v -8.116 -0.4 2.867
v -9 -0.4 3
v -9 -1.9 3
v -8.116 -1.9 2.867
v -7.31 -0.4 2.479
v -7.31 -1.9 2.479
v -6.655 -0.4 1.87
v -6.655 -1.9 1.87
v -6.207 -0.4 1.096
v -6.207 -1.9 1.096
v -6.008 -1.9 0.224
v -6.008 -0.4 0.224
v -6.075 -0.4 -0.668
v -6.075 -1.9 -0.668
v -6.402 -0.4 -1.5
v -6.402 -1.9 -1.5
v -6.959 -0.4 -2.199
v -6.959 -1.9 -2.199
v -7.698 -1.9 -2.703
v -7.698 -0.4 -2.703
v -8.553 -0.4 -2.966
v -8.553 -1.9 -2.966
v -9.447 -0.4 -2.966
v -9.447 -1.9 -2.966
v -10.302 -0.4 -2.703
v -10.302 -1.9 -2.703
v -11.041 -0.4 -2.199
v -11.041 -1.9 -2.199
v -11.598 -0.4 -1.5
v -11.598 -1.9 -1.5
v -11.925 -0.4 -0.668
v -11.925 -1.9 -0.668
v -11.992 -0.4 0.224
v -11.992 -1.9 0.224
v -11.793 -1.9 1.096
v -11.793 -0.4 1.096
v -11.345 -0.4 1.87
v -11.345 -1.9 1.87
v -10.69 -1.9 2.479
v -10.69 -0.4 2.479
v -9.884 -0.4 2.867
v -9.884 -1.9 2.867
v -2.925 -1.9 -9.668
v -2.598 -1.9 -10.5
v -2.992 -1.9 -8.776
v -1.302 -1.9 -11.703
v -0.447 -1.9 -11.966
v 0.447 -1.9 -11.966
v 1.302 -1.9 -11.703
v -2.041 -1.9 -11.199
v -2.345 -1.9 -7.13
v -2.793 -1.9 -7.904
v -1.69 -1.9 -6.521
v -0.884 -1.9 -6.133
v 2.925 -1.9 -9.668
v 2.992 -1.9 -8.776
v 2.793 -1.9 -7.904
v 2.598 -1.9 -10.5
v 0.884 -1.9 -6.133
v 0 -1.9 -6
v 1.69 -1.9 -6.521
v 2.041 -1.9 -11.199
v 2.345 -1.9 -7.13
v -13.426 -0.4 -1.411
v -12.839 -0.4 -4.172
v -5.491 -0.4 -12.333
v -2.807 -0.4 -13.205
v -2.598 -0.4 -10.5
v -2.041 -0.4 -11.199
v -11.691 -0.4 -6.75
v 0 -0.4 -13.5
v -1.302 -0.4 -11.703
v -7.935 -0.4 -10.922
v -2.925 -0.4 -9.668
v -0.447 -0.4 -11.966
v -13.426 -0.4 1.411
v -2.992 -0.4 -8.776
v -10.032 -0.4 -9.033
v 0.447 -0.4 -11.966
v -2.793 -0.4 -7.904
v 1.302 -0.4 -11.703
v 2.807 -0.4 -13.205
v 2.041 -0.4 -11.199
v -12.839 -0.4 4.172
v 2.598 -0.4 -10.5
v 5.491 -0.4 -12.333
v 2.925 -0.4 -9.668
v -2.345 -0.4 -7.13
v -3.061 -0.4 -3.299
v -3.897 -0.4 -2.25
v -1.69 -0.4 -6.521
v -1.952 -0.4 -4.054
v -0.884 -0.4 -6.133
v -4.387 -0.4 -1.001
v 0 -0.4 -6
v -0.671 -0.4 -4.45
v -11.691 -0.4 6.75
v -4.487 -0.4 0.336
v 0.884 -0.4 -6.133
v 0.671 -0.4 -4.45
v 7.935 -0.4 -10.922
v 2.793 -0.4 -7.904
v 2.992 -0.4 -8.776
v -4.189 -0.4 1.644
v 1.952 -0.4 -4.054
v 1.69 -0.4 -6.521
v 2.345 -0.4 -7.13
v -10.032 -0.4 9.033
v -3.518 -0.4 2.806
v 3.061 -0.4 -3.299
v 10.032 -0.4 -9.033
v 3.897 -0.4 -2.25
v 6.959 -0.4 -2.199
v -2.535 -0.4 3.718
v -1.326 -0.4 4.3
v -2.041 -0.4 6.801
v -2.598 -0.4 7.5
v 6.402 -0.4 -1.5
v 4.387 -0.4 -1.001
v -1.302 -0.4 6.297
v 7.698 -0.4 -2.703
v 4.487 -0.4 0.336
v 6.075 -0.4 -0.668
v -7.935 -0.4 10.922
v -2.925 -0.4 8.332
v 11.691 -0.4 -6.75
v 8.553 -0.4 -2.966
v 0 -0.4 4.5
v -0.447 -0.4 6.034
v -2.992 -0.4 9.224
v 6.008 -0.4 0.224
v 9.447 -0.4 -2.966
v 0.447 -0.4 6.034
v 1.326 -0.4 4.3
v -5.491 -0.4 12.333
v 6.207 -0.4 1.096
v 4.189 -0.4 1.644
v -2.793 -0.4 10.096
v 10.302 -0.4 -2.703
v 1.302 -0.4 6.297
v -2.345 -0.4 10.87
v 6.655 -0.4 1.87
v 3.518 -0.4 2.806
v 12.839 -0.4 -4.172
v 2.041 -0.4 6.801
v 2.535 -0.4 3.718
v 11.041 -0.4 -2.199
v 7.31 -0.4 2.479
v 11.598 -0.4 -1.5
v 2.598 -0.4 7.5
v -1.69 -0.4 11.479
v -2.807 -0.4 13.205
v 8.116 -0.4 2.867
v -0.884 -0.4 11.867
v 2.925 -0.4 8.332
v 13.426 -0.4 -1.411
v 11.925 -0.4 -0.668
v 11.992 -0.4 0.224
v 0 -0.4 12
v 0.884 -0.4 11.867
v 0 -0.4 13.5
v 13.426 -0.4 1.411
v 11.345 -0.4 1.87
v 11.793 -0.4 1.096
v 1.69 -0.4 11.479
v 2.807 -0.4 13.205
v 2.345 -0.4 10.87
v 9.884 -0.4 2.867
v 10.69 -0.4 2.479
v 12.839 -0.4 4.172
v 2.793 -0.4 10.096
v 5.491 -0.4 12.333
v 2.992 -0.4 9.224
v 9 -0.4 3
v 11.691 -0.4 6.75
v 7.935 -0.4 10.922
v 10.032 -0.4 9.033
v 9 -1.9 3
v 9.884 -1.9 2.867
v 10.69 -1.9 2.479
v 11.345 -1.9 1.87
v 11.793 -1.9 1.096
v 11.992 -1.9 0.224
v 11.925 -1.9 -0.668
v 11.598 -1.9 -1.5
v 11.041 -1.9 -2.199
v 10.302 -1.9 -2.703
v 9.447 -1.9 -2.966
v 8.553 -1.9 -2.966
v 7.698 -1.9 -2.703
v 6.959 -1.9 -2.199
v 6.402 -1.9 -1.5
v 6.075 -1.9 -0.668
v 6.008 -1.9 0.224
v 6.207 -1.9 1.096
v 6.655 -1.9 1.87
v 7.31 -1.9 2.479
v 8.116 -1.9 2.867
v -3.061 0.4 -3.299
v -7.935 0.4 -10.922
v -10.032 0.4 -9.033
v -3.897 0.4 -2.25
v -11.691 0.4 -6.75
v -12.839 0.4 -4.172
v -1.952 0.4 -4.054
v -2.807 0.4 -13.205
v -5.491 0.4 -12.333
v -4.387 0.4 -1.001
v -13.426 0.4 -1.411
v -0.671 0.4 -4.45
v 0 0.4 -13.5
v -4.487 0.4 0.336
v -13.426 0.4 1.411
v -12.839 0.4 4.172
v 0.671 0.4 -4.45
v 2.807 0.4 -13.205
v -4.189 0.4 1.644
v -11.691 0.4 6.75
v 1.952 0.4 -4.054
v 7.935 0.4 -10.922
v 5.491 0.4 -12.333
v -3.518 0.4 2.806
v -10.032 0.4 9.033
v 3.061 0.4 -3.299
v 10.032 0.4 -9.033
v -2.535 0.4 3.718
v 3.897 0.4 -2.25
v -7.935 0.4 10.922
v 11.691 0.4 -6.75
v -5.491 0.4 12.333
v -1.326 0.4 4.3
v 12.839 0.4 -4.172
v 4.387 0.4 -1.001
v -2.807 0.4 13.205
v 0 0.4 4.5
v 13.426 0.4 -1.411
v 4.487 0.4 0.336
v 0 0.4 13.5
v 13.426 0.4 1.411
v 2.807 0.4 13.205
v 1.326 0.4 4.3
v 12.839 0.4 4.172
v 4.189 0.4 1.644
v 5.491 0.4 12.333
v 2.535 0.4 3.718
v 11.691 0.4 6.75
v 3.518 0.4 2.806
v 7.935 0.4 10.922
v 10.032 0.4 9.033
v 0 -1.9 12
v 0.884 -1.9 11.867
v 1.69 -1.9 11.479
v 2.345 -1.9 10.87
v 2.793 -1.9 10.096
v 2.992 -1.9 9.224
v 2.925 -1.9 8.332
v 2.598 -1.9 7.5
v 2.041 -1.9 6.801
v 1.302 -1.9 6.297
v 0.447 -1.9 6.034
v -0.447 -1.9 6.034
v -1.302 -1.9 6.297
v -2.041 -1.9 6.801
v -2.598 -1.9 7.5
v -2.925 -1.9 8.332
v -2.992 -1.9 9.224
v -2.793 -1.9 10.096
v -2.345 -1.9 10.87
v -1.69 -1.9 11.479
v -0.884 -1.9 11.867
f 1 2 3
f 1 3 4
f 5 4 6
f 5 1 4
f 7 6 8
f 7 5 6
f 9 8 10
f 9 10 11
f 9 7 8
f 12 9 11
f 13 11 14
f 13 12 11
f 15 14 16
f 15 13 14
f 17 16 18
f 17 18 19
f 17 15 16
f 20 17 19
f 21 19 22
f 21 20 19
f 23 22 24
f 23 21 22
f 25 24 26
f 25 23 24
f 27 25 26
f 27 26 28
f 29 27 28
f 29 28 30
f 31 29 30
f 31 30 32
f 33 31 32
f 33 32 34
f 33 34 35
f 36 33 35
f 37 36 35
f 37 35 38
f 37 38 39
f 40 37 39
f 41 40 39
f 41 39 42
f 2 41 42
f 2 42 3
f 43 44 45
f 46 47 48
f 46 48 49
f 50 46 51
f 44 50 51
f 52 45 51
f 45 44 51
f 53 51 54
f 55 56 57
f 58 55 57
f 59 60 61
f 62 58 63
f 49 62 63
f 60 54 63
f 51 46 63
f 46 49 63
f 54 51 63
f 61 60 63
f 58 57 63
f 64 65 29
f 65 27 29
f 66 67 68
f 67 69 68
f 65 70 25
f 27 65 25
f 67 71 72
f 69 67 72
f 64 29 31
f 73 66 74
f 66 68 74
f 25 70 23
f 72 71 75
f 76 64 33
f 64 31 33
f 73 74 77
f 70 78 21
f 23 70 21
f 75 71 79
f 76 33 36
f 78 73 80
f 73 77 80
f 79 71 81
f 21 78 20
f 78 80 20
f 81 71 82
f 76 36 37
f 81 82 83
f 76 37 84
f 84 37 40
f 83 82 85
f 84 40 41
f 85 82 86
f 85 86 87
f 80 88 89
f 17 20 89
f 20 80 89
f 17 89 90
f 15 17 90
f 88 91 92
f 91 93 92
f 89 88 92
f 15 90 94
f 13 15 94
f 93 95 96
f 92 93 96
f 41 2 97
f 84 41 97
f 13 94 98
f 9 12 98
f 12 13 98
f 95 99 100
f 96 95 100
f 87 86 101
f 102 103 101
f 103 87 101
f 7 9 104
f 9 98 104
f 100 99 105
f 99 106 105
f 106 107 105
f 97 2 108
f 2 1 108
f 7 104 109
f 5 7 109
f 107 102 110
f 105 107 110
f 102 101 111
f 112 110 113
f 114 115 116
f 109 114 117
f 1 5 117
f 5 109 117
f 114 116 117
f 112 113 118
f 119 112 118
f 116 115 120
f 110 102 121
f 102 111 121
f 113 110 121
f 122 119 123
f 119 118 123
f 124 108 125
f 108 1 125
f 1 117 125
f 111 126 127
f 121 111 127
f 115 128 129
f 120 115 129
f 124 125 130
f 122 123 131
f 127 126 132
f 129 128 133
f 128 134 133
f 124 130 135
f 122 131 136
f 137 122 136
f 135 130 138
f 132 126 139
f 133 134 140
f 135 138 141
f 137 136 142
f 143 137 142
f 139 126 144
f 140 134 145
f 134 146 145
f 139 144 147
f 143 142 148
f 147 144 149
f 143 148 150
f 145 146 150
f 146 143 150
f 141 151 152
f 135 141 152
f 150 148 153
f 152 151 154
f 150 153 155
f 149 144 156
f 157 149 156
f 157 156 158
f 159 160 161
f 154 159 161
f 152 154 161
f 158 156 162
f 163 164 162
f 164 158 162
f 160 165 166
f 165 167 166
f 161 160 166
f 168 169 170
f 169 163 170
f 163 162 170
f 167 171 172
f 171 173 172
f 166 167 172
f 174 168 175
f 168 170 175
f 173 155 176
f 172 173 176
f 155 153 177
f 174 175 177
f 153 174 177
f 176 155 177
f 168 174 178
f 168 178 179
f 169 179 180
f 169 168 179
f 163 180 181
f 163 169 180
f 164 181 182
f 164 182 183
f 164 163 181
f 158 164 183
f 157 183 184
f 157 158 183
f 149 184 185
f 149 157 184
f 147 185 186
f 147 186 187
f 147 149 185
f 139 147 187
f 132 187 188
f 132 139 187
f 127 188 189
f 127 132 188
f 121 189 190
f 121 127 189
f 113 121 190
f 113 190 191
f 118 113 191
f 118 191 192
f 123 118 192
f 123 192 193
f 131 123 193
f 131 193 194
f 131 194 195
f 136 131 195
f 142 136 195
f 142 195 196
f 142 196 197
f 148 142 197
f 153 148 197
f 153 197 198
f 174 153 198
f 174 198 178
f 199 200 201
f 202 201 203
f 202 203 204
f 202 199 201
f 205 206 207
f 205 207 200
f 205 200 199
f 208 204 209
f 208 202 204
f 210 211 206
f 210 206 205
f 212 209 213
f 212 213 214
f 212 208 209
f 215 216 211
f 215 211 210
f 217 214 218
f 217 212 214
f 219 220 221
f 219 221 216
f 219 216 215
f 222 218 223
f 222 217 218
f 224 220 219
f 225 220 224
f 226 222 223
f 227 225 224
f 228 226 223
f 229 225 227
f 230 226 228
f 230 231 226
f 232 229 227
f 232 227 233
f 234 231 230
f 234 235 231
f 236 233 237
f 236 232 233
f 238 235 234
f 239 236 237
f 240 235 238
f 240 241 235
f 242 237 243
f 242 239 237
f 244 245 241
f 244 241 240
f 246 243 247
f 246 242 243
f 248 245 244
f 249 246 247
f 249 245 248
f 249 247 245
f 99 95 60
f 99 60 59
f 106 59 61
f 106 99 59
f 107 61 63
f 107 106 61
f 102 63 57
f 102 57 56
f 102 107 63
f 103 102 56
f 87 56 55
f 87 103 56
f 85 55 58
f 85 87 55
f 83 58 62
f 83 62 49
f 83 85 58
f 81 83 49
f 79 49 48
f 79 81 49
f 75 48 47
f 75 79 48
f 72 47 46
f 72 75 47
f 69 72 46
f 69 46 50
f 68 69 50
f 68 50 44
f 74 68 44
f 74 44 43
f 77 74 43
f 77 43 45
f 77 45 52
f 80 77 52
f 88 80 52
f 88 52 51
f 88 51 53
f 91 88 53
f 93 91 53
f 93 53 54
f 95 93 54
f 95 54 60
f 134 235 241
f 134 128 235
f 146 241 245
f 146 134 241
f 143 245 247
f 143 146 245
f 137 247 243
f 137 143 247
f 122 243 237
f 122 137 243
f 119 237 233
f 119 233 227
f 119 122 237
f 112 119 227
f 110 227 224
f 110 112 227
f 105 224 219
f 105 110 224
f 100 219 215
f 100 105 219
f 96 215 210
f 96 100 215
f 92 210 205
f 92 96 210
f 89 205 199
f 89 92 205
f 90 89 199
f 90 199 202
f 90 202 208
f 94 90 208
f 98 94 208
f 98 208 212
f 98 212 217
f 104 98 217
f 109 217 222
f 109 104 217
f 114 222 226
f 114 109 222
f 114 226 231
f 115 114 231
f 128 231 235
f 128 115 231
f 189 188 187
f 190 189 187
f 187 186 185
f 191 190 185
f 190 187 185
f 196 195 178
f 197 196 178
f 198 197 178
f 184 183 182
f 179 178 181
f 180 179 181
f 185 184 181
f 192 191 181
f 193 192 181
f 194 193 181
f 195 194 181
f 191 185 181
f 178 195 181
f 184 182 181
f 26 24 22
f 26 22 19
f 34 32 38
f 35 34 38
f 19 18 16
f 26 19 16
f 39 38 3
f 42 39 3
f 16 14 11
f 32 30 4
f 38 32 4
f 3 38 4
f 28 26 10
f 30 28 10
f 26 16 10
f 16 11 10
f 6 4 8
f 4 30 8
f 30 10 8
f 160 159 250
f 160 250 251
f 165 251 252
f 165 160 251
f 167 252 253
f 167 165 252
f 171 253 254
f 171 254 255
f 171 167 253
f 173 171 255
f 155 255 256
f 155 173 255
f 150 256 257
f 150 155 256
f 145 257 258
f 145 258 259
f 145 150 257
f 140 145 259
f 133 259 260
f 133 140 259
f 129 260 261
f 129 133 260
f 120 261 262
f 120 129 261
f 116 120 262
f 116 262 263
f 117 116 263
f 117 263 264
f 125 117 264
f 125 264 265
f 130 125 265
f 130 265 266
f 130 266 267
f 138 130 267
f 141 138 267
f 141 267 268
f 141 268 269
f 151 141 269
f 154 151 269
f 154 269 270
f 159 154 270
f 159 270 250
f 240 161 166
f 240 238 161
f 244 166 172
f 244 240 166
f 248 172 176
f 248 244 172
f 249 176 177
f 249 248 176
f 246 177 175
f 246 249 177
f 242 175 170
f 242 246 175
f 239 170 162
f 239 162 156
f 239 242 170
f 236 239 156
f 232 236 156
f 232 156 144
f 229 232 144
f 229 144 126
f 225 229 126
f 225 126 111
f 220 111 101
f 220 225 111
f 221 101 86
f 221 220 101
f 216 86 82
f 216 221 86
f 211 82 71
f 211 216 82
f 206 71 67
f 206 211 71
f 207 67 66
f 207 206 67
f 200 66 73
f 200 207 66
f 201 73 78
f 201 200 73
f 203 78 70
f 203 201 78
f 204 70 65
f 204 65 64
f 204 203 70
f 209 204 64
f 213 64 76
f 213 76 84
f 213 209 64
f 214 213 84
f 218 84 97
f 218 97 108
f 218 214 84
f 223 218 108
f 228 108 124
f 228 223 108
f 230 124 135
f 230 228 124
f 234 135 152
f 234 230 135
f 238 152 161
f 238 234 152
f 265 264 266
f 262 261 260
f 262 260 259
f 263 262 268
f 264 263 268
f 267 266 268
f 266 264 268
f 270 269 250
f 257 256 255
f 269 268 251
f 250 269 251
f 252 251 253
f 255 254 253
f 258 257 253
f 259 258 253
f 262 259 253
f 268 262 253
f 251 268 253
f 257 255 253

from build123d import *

# Parameters (mm, degrees)
SKETCH1_R           = 13.5
SKETCH1_R_2         = 4.5
BOSS_EXTRUDE1_DEPTH = 0.4
SKETCH2_R           = 3
BOSS_EXTRUDE3_DEPTH = 1.9


with BuildPart() as part:
    # Sketch1 → Boss-Extrude1 (new, symmetric)
    with BuildSketch(Plane(origin=(0, 0, 0), x_dir=(1, 0, 0), z_dir=(0, 1, 0))):
        with Locations(Location((0, 0, 0), (0, 0, 270))):
            Circle(SKETCH1_R)
        with Locations(Location((0, 0, 0), (0, 0, 270))):
            Circle(SKETCH1_R_2, mode=Mode.SUBTRACT)
    extrude(amount=BOSS_EXTRUDE1_DEPTH, both=True)

    # Sketch2 → Boss-Extrude3 (add)
    with BuildSketch(Plane(origin=(0, 0, 0), x_dir=(1, 0, 0), z_dir=(0, 1, 0))):
        with Locations(Location((0, 9, 0), (0, 0, 270))):
            Circle(SKETCH2_R)
        with Locations(Location((9, 0, 0), (0, 0, 270))):
            Circle(SKETCH2_R)
        with Locations(Location((-9, 0, 0), (0, 0, 270))):
            Circle(SKETCH2_R)
        with Locations(Location((0, -9, 0), (0, 0, 270))):
            Circle(SKETCH2_R)
    extrude(amount=-BOSS_EXTRUDE3_DEPTH)


solid = part.part
